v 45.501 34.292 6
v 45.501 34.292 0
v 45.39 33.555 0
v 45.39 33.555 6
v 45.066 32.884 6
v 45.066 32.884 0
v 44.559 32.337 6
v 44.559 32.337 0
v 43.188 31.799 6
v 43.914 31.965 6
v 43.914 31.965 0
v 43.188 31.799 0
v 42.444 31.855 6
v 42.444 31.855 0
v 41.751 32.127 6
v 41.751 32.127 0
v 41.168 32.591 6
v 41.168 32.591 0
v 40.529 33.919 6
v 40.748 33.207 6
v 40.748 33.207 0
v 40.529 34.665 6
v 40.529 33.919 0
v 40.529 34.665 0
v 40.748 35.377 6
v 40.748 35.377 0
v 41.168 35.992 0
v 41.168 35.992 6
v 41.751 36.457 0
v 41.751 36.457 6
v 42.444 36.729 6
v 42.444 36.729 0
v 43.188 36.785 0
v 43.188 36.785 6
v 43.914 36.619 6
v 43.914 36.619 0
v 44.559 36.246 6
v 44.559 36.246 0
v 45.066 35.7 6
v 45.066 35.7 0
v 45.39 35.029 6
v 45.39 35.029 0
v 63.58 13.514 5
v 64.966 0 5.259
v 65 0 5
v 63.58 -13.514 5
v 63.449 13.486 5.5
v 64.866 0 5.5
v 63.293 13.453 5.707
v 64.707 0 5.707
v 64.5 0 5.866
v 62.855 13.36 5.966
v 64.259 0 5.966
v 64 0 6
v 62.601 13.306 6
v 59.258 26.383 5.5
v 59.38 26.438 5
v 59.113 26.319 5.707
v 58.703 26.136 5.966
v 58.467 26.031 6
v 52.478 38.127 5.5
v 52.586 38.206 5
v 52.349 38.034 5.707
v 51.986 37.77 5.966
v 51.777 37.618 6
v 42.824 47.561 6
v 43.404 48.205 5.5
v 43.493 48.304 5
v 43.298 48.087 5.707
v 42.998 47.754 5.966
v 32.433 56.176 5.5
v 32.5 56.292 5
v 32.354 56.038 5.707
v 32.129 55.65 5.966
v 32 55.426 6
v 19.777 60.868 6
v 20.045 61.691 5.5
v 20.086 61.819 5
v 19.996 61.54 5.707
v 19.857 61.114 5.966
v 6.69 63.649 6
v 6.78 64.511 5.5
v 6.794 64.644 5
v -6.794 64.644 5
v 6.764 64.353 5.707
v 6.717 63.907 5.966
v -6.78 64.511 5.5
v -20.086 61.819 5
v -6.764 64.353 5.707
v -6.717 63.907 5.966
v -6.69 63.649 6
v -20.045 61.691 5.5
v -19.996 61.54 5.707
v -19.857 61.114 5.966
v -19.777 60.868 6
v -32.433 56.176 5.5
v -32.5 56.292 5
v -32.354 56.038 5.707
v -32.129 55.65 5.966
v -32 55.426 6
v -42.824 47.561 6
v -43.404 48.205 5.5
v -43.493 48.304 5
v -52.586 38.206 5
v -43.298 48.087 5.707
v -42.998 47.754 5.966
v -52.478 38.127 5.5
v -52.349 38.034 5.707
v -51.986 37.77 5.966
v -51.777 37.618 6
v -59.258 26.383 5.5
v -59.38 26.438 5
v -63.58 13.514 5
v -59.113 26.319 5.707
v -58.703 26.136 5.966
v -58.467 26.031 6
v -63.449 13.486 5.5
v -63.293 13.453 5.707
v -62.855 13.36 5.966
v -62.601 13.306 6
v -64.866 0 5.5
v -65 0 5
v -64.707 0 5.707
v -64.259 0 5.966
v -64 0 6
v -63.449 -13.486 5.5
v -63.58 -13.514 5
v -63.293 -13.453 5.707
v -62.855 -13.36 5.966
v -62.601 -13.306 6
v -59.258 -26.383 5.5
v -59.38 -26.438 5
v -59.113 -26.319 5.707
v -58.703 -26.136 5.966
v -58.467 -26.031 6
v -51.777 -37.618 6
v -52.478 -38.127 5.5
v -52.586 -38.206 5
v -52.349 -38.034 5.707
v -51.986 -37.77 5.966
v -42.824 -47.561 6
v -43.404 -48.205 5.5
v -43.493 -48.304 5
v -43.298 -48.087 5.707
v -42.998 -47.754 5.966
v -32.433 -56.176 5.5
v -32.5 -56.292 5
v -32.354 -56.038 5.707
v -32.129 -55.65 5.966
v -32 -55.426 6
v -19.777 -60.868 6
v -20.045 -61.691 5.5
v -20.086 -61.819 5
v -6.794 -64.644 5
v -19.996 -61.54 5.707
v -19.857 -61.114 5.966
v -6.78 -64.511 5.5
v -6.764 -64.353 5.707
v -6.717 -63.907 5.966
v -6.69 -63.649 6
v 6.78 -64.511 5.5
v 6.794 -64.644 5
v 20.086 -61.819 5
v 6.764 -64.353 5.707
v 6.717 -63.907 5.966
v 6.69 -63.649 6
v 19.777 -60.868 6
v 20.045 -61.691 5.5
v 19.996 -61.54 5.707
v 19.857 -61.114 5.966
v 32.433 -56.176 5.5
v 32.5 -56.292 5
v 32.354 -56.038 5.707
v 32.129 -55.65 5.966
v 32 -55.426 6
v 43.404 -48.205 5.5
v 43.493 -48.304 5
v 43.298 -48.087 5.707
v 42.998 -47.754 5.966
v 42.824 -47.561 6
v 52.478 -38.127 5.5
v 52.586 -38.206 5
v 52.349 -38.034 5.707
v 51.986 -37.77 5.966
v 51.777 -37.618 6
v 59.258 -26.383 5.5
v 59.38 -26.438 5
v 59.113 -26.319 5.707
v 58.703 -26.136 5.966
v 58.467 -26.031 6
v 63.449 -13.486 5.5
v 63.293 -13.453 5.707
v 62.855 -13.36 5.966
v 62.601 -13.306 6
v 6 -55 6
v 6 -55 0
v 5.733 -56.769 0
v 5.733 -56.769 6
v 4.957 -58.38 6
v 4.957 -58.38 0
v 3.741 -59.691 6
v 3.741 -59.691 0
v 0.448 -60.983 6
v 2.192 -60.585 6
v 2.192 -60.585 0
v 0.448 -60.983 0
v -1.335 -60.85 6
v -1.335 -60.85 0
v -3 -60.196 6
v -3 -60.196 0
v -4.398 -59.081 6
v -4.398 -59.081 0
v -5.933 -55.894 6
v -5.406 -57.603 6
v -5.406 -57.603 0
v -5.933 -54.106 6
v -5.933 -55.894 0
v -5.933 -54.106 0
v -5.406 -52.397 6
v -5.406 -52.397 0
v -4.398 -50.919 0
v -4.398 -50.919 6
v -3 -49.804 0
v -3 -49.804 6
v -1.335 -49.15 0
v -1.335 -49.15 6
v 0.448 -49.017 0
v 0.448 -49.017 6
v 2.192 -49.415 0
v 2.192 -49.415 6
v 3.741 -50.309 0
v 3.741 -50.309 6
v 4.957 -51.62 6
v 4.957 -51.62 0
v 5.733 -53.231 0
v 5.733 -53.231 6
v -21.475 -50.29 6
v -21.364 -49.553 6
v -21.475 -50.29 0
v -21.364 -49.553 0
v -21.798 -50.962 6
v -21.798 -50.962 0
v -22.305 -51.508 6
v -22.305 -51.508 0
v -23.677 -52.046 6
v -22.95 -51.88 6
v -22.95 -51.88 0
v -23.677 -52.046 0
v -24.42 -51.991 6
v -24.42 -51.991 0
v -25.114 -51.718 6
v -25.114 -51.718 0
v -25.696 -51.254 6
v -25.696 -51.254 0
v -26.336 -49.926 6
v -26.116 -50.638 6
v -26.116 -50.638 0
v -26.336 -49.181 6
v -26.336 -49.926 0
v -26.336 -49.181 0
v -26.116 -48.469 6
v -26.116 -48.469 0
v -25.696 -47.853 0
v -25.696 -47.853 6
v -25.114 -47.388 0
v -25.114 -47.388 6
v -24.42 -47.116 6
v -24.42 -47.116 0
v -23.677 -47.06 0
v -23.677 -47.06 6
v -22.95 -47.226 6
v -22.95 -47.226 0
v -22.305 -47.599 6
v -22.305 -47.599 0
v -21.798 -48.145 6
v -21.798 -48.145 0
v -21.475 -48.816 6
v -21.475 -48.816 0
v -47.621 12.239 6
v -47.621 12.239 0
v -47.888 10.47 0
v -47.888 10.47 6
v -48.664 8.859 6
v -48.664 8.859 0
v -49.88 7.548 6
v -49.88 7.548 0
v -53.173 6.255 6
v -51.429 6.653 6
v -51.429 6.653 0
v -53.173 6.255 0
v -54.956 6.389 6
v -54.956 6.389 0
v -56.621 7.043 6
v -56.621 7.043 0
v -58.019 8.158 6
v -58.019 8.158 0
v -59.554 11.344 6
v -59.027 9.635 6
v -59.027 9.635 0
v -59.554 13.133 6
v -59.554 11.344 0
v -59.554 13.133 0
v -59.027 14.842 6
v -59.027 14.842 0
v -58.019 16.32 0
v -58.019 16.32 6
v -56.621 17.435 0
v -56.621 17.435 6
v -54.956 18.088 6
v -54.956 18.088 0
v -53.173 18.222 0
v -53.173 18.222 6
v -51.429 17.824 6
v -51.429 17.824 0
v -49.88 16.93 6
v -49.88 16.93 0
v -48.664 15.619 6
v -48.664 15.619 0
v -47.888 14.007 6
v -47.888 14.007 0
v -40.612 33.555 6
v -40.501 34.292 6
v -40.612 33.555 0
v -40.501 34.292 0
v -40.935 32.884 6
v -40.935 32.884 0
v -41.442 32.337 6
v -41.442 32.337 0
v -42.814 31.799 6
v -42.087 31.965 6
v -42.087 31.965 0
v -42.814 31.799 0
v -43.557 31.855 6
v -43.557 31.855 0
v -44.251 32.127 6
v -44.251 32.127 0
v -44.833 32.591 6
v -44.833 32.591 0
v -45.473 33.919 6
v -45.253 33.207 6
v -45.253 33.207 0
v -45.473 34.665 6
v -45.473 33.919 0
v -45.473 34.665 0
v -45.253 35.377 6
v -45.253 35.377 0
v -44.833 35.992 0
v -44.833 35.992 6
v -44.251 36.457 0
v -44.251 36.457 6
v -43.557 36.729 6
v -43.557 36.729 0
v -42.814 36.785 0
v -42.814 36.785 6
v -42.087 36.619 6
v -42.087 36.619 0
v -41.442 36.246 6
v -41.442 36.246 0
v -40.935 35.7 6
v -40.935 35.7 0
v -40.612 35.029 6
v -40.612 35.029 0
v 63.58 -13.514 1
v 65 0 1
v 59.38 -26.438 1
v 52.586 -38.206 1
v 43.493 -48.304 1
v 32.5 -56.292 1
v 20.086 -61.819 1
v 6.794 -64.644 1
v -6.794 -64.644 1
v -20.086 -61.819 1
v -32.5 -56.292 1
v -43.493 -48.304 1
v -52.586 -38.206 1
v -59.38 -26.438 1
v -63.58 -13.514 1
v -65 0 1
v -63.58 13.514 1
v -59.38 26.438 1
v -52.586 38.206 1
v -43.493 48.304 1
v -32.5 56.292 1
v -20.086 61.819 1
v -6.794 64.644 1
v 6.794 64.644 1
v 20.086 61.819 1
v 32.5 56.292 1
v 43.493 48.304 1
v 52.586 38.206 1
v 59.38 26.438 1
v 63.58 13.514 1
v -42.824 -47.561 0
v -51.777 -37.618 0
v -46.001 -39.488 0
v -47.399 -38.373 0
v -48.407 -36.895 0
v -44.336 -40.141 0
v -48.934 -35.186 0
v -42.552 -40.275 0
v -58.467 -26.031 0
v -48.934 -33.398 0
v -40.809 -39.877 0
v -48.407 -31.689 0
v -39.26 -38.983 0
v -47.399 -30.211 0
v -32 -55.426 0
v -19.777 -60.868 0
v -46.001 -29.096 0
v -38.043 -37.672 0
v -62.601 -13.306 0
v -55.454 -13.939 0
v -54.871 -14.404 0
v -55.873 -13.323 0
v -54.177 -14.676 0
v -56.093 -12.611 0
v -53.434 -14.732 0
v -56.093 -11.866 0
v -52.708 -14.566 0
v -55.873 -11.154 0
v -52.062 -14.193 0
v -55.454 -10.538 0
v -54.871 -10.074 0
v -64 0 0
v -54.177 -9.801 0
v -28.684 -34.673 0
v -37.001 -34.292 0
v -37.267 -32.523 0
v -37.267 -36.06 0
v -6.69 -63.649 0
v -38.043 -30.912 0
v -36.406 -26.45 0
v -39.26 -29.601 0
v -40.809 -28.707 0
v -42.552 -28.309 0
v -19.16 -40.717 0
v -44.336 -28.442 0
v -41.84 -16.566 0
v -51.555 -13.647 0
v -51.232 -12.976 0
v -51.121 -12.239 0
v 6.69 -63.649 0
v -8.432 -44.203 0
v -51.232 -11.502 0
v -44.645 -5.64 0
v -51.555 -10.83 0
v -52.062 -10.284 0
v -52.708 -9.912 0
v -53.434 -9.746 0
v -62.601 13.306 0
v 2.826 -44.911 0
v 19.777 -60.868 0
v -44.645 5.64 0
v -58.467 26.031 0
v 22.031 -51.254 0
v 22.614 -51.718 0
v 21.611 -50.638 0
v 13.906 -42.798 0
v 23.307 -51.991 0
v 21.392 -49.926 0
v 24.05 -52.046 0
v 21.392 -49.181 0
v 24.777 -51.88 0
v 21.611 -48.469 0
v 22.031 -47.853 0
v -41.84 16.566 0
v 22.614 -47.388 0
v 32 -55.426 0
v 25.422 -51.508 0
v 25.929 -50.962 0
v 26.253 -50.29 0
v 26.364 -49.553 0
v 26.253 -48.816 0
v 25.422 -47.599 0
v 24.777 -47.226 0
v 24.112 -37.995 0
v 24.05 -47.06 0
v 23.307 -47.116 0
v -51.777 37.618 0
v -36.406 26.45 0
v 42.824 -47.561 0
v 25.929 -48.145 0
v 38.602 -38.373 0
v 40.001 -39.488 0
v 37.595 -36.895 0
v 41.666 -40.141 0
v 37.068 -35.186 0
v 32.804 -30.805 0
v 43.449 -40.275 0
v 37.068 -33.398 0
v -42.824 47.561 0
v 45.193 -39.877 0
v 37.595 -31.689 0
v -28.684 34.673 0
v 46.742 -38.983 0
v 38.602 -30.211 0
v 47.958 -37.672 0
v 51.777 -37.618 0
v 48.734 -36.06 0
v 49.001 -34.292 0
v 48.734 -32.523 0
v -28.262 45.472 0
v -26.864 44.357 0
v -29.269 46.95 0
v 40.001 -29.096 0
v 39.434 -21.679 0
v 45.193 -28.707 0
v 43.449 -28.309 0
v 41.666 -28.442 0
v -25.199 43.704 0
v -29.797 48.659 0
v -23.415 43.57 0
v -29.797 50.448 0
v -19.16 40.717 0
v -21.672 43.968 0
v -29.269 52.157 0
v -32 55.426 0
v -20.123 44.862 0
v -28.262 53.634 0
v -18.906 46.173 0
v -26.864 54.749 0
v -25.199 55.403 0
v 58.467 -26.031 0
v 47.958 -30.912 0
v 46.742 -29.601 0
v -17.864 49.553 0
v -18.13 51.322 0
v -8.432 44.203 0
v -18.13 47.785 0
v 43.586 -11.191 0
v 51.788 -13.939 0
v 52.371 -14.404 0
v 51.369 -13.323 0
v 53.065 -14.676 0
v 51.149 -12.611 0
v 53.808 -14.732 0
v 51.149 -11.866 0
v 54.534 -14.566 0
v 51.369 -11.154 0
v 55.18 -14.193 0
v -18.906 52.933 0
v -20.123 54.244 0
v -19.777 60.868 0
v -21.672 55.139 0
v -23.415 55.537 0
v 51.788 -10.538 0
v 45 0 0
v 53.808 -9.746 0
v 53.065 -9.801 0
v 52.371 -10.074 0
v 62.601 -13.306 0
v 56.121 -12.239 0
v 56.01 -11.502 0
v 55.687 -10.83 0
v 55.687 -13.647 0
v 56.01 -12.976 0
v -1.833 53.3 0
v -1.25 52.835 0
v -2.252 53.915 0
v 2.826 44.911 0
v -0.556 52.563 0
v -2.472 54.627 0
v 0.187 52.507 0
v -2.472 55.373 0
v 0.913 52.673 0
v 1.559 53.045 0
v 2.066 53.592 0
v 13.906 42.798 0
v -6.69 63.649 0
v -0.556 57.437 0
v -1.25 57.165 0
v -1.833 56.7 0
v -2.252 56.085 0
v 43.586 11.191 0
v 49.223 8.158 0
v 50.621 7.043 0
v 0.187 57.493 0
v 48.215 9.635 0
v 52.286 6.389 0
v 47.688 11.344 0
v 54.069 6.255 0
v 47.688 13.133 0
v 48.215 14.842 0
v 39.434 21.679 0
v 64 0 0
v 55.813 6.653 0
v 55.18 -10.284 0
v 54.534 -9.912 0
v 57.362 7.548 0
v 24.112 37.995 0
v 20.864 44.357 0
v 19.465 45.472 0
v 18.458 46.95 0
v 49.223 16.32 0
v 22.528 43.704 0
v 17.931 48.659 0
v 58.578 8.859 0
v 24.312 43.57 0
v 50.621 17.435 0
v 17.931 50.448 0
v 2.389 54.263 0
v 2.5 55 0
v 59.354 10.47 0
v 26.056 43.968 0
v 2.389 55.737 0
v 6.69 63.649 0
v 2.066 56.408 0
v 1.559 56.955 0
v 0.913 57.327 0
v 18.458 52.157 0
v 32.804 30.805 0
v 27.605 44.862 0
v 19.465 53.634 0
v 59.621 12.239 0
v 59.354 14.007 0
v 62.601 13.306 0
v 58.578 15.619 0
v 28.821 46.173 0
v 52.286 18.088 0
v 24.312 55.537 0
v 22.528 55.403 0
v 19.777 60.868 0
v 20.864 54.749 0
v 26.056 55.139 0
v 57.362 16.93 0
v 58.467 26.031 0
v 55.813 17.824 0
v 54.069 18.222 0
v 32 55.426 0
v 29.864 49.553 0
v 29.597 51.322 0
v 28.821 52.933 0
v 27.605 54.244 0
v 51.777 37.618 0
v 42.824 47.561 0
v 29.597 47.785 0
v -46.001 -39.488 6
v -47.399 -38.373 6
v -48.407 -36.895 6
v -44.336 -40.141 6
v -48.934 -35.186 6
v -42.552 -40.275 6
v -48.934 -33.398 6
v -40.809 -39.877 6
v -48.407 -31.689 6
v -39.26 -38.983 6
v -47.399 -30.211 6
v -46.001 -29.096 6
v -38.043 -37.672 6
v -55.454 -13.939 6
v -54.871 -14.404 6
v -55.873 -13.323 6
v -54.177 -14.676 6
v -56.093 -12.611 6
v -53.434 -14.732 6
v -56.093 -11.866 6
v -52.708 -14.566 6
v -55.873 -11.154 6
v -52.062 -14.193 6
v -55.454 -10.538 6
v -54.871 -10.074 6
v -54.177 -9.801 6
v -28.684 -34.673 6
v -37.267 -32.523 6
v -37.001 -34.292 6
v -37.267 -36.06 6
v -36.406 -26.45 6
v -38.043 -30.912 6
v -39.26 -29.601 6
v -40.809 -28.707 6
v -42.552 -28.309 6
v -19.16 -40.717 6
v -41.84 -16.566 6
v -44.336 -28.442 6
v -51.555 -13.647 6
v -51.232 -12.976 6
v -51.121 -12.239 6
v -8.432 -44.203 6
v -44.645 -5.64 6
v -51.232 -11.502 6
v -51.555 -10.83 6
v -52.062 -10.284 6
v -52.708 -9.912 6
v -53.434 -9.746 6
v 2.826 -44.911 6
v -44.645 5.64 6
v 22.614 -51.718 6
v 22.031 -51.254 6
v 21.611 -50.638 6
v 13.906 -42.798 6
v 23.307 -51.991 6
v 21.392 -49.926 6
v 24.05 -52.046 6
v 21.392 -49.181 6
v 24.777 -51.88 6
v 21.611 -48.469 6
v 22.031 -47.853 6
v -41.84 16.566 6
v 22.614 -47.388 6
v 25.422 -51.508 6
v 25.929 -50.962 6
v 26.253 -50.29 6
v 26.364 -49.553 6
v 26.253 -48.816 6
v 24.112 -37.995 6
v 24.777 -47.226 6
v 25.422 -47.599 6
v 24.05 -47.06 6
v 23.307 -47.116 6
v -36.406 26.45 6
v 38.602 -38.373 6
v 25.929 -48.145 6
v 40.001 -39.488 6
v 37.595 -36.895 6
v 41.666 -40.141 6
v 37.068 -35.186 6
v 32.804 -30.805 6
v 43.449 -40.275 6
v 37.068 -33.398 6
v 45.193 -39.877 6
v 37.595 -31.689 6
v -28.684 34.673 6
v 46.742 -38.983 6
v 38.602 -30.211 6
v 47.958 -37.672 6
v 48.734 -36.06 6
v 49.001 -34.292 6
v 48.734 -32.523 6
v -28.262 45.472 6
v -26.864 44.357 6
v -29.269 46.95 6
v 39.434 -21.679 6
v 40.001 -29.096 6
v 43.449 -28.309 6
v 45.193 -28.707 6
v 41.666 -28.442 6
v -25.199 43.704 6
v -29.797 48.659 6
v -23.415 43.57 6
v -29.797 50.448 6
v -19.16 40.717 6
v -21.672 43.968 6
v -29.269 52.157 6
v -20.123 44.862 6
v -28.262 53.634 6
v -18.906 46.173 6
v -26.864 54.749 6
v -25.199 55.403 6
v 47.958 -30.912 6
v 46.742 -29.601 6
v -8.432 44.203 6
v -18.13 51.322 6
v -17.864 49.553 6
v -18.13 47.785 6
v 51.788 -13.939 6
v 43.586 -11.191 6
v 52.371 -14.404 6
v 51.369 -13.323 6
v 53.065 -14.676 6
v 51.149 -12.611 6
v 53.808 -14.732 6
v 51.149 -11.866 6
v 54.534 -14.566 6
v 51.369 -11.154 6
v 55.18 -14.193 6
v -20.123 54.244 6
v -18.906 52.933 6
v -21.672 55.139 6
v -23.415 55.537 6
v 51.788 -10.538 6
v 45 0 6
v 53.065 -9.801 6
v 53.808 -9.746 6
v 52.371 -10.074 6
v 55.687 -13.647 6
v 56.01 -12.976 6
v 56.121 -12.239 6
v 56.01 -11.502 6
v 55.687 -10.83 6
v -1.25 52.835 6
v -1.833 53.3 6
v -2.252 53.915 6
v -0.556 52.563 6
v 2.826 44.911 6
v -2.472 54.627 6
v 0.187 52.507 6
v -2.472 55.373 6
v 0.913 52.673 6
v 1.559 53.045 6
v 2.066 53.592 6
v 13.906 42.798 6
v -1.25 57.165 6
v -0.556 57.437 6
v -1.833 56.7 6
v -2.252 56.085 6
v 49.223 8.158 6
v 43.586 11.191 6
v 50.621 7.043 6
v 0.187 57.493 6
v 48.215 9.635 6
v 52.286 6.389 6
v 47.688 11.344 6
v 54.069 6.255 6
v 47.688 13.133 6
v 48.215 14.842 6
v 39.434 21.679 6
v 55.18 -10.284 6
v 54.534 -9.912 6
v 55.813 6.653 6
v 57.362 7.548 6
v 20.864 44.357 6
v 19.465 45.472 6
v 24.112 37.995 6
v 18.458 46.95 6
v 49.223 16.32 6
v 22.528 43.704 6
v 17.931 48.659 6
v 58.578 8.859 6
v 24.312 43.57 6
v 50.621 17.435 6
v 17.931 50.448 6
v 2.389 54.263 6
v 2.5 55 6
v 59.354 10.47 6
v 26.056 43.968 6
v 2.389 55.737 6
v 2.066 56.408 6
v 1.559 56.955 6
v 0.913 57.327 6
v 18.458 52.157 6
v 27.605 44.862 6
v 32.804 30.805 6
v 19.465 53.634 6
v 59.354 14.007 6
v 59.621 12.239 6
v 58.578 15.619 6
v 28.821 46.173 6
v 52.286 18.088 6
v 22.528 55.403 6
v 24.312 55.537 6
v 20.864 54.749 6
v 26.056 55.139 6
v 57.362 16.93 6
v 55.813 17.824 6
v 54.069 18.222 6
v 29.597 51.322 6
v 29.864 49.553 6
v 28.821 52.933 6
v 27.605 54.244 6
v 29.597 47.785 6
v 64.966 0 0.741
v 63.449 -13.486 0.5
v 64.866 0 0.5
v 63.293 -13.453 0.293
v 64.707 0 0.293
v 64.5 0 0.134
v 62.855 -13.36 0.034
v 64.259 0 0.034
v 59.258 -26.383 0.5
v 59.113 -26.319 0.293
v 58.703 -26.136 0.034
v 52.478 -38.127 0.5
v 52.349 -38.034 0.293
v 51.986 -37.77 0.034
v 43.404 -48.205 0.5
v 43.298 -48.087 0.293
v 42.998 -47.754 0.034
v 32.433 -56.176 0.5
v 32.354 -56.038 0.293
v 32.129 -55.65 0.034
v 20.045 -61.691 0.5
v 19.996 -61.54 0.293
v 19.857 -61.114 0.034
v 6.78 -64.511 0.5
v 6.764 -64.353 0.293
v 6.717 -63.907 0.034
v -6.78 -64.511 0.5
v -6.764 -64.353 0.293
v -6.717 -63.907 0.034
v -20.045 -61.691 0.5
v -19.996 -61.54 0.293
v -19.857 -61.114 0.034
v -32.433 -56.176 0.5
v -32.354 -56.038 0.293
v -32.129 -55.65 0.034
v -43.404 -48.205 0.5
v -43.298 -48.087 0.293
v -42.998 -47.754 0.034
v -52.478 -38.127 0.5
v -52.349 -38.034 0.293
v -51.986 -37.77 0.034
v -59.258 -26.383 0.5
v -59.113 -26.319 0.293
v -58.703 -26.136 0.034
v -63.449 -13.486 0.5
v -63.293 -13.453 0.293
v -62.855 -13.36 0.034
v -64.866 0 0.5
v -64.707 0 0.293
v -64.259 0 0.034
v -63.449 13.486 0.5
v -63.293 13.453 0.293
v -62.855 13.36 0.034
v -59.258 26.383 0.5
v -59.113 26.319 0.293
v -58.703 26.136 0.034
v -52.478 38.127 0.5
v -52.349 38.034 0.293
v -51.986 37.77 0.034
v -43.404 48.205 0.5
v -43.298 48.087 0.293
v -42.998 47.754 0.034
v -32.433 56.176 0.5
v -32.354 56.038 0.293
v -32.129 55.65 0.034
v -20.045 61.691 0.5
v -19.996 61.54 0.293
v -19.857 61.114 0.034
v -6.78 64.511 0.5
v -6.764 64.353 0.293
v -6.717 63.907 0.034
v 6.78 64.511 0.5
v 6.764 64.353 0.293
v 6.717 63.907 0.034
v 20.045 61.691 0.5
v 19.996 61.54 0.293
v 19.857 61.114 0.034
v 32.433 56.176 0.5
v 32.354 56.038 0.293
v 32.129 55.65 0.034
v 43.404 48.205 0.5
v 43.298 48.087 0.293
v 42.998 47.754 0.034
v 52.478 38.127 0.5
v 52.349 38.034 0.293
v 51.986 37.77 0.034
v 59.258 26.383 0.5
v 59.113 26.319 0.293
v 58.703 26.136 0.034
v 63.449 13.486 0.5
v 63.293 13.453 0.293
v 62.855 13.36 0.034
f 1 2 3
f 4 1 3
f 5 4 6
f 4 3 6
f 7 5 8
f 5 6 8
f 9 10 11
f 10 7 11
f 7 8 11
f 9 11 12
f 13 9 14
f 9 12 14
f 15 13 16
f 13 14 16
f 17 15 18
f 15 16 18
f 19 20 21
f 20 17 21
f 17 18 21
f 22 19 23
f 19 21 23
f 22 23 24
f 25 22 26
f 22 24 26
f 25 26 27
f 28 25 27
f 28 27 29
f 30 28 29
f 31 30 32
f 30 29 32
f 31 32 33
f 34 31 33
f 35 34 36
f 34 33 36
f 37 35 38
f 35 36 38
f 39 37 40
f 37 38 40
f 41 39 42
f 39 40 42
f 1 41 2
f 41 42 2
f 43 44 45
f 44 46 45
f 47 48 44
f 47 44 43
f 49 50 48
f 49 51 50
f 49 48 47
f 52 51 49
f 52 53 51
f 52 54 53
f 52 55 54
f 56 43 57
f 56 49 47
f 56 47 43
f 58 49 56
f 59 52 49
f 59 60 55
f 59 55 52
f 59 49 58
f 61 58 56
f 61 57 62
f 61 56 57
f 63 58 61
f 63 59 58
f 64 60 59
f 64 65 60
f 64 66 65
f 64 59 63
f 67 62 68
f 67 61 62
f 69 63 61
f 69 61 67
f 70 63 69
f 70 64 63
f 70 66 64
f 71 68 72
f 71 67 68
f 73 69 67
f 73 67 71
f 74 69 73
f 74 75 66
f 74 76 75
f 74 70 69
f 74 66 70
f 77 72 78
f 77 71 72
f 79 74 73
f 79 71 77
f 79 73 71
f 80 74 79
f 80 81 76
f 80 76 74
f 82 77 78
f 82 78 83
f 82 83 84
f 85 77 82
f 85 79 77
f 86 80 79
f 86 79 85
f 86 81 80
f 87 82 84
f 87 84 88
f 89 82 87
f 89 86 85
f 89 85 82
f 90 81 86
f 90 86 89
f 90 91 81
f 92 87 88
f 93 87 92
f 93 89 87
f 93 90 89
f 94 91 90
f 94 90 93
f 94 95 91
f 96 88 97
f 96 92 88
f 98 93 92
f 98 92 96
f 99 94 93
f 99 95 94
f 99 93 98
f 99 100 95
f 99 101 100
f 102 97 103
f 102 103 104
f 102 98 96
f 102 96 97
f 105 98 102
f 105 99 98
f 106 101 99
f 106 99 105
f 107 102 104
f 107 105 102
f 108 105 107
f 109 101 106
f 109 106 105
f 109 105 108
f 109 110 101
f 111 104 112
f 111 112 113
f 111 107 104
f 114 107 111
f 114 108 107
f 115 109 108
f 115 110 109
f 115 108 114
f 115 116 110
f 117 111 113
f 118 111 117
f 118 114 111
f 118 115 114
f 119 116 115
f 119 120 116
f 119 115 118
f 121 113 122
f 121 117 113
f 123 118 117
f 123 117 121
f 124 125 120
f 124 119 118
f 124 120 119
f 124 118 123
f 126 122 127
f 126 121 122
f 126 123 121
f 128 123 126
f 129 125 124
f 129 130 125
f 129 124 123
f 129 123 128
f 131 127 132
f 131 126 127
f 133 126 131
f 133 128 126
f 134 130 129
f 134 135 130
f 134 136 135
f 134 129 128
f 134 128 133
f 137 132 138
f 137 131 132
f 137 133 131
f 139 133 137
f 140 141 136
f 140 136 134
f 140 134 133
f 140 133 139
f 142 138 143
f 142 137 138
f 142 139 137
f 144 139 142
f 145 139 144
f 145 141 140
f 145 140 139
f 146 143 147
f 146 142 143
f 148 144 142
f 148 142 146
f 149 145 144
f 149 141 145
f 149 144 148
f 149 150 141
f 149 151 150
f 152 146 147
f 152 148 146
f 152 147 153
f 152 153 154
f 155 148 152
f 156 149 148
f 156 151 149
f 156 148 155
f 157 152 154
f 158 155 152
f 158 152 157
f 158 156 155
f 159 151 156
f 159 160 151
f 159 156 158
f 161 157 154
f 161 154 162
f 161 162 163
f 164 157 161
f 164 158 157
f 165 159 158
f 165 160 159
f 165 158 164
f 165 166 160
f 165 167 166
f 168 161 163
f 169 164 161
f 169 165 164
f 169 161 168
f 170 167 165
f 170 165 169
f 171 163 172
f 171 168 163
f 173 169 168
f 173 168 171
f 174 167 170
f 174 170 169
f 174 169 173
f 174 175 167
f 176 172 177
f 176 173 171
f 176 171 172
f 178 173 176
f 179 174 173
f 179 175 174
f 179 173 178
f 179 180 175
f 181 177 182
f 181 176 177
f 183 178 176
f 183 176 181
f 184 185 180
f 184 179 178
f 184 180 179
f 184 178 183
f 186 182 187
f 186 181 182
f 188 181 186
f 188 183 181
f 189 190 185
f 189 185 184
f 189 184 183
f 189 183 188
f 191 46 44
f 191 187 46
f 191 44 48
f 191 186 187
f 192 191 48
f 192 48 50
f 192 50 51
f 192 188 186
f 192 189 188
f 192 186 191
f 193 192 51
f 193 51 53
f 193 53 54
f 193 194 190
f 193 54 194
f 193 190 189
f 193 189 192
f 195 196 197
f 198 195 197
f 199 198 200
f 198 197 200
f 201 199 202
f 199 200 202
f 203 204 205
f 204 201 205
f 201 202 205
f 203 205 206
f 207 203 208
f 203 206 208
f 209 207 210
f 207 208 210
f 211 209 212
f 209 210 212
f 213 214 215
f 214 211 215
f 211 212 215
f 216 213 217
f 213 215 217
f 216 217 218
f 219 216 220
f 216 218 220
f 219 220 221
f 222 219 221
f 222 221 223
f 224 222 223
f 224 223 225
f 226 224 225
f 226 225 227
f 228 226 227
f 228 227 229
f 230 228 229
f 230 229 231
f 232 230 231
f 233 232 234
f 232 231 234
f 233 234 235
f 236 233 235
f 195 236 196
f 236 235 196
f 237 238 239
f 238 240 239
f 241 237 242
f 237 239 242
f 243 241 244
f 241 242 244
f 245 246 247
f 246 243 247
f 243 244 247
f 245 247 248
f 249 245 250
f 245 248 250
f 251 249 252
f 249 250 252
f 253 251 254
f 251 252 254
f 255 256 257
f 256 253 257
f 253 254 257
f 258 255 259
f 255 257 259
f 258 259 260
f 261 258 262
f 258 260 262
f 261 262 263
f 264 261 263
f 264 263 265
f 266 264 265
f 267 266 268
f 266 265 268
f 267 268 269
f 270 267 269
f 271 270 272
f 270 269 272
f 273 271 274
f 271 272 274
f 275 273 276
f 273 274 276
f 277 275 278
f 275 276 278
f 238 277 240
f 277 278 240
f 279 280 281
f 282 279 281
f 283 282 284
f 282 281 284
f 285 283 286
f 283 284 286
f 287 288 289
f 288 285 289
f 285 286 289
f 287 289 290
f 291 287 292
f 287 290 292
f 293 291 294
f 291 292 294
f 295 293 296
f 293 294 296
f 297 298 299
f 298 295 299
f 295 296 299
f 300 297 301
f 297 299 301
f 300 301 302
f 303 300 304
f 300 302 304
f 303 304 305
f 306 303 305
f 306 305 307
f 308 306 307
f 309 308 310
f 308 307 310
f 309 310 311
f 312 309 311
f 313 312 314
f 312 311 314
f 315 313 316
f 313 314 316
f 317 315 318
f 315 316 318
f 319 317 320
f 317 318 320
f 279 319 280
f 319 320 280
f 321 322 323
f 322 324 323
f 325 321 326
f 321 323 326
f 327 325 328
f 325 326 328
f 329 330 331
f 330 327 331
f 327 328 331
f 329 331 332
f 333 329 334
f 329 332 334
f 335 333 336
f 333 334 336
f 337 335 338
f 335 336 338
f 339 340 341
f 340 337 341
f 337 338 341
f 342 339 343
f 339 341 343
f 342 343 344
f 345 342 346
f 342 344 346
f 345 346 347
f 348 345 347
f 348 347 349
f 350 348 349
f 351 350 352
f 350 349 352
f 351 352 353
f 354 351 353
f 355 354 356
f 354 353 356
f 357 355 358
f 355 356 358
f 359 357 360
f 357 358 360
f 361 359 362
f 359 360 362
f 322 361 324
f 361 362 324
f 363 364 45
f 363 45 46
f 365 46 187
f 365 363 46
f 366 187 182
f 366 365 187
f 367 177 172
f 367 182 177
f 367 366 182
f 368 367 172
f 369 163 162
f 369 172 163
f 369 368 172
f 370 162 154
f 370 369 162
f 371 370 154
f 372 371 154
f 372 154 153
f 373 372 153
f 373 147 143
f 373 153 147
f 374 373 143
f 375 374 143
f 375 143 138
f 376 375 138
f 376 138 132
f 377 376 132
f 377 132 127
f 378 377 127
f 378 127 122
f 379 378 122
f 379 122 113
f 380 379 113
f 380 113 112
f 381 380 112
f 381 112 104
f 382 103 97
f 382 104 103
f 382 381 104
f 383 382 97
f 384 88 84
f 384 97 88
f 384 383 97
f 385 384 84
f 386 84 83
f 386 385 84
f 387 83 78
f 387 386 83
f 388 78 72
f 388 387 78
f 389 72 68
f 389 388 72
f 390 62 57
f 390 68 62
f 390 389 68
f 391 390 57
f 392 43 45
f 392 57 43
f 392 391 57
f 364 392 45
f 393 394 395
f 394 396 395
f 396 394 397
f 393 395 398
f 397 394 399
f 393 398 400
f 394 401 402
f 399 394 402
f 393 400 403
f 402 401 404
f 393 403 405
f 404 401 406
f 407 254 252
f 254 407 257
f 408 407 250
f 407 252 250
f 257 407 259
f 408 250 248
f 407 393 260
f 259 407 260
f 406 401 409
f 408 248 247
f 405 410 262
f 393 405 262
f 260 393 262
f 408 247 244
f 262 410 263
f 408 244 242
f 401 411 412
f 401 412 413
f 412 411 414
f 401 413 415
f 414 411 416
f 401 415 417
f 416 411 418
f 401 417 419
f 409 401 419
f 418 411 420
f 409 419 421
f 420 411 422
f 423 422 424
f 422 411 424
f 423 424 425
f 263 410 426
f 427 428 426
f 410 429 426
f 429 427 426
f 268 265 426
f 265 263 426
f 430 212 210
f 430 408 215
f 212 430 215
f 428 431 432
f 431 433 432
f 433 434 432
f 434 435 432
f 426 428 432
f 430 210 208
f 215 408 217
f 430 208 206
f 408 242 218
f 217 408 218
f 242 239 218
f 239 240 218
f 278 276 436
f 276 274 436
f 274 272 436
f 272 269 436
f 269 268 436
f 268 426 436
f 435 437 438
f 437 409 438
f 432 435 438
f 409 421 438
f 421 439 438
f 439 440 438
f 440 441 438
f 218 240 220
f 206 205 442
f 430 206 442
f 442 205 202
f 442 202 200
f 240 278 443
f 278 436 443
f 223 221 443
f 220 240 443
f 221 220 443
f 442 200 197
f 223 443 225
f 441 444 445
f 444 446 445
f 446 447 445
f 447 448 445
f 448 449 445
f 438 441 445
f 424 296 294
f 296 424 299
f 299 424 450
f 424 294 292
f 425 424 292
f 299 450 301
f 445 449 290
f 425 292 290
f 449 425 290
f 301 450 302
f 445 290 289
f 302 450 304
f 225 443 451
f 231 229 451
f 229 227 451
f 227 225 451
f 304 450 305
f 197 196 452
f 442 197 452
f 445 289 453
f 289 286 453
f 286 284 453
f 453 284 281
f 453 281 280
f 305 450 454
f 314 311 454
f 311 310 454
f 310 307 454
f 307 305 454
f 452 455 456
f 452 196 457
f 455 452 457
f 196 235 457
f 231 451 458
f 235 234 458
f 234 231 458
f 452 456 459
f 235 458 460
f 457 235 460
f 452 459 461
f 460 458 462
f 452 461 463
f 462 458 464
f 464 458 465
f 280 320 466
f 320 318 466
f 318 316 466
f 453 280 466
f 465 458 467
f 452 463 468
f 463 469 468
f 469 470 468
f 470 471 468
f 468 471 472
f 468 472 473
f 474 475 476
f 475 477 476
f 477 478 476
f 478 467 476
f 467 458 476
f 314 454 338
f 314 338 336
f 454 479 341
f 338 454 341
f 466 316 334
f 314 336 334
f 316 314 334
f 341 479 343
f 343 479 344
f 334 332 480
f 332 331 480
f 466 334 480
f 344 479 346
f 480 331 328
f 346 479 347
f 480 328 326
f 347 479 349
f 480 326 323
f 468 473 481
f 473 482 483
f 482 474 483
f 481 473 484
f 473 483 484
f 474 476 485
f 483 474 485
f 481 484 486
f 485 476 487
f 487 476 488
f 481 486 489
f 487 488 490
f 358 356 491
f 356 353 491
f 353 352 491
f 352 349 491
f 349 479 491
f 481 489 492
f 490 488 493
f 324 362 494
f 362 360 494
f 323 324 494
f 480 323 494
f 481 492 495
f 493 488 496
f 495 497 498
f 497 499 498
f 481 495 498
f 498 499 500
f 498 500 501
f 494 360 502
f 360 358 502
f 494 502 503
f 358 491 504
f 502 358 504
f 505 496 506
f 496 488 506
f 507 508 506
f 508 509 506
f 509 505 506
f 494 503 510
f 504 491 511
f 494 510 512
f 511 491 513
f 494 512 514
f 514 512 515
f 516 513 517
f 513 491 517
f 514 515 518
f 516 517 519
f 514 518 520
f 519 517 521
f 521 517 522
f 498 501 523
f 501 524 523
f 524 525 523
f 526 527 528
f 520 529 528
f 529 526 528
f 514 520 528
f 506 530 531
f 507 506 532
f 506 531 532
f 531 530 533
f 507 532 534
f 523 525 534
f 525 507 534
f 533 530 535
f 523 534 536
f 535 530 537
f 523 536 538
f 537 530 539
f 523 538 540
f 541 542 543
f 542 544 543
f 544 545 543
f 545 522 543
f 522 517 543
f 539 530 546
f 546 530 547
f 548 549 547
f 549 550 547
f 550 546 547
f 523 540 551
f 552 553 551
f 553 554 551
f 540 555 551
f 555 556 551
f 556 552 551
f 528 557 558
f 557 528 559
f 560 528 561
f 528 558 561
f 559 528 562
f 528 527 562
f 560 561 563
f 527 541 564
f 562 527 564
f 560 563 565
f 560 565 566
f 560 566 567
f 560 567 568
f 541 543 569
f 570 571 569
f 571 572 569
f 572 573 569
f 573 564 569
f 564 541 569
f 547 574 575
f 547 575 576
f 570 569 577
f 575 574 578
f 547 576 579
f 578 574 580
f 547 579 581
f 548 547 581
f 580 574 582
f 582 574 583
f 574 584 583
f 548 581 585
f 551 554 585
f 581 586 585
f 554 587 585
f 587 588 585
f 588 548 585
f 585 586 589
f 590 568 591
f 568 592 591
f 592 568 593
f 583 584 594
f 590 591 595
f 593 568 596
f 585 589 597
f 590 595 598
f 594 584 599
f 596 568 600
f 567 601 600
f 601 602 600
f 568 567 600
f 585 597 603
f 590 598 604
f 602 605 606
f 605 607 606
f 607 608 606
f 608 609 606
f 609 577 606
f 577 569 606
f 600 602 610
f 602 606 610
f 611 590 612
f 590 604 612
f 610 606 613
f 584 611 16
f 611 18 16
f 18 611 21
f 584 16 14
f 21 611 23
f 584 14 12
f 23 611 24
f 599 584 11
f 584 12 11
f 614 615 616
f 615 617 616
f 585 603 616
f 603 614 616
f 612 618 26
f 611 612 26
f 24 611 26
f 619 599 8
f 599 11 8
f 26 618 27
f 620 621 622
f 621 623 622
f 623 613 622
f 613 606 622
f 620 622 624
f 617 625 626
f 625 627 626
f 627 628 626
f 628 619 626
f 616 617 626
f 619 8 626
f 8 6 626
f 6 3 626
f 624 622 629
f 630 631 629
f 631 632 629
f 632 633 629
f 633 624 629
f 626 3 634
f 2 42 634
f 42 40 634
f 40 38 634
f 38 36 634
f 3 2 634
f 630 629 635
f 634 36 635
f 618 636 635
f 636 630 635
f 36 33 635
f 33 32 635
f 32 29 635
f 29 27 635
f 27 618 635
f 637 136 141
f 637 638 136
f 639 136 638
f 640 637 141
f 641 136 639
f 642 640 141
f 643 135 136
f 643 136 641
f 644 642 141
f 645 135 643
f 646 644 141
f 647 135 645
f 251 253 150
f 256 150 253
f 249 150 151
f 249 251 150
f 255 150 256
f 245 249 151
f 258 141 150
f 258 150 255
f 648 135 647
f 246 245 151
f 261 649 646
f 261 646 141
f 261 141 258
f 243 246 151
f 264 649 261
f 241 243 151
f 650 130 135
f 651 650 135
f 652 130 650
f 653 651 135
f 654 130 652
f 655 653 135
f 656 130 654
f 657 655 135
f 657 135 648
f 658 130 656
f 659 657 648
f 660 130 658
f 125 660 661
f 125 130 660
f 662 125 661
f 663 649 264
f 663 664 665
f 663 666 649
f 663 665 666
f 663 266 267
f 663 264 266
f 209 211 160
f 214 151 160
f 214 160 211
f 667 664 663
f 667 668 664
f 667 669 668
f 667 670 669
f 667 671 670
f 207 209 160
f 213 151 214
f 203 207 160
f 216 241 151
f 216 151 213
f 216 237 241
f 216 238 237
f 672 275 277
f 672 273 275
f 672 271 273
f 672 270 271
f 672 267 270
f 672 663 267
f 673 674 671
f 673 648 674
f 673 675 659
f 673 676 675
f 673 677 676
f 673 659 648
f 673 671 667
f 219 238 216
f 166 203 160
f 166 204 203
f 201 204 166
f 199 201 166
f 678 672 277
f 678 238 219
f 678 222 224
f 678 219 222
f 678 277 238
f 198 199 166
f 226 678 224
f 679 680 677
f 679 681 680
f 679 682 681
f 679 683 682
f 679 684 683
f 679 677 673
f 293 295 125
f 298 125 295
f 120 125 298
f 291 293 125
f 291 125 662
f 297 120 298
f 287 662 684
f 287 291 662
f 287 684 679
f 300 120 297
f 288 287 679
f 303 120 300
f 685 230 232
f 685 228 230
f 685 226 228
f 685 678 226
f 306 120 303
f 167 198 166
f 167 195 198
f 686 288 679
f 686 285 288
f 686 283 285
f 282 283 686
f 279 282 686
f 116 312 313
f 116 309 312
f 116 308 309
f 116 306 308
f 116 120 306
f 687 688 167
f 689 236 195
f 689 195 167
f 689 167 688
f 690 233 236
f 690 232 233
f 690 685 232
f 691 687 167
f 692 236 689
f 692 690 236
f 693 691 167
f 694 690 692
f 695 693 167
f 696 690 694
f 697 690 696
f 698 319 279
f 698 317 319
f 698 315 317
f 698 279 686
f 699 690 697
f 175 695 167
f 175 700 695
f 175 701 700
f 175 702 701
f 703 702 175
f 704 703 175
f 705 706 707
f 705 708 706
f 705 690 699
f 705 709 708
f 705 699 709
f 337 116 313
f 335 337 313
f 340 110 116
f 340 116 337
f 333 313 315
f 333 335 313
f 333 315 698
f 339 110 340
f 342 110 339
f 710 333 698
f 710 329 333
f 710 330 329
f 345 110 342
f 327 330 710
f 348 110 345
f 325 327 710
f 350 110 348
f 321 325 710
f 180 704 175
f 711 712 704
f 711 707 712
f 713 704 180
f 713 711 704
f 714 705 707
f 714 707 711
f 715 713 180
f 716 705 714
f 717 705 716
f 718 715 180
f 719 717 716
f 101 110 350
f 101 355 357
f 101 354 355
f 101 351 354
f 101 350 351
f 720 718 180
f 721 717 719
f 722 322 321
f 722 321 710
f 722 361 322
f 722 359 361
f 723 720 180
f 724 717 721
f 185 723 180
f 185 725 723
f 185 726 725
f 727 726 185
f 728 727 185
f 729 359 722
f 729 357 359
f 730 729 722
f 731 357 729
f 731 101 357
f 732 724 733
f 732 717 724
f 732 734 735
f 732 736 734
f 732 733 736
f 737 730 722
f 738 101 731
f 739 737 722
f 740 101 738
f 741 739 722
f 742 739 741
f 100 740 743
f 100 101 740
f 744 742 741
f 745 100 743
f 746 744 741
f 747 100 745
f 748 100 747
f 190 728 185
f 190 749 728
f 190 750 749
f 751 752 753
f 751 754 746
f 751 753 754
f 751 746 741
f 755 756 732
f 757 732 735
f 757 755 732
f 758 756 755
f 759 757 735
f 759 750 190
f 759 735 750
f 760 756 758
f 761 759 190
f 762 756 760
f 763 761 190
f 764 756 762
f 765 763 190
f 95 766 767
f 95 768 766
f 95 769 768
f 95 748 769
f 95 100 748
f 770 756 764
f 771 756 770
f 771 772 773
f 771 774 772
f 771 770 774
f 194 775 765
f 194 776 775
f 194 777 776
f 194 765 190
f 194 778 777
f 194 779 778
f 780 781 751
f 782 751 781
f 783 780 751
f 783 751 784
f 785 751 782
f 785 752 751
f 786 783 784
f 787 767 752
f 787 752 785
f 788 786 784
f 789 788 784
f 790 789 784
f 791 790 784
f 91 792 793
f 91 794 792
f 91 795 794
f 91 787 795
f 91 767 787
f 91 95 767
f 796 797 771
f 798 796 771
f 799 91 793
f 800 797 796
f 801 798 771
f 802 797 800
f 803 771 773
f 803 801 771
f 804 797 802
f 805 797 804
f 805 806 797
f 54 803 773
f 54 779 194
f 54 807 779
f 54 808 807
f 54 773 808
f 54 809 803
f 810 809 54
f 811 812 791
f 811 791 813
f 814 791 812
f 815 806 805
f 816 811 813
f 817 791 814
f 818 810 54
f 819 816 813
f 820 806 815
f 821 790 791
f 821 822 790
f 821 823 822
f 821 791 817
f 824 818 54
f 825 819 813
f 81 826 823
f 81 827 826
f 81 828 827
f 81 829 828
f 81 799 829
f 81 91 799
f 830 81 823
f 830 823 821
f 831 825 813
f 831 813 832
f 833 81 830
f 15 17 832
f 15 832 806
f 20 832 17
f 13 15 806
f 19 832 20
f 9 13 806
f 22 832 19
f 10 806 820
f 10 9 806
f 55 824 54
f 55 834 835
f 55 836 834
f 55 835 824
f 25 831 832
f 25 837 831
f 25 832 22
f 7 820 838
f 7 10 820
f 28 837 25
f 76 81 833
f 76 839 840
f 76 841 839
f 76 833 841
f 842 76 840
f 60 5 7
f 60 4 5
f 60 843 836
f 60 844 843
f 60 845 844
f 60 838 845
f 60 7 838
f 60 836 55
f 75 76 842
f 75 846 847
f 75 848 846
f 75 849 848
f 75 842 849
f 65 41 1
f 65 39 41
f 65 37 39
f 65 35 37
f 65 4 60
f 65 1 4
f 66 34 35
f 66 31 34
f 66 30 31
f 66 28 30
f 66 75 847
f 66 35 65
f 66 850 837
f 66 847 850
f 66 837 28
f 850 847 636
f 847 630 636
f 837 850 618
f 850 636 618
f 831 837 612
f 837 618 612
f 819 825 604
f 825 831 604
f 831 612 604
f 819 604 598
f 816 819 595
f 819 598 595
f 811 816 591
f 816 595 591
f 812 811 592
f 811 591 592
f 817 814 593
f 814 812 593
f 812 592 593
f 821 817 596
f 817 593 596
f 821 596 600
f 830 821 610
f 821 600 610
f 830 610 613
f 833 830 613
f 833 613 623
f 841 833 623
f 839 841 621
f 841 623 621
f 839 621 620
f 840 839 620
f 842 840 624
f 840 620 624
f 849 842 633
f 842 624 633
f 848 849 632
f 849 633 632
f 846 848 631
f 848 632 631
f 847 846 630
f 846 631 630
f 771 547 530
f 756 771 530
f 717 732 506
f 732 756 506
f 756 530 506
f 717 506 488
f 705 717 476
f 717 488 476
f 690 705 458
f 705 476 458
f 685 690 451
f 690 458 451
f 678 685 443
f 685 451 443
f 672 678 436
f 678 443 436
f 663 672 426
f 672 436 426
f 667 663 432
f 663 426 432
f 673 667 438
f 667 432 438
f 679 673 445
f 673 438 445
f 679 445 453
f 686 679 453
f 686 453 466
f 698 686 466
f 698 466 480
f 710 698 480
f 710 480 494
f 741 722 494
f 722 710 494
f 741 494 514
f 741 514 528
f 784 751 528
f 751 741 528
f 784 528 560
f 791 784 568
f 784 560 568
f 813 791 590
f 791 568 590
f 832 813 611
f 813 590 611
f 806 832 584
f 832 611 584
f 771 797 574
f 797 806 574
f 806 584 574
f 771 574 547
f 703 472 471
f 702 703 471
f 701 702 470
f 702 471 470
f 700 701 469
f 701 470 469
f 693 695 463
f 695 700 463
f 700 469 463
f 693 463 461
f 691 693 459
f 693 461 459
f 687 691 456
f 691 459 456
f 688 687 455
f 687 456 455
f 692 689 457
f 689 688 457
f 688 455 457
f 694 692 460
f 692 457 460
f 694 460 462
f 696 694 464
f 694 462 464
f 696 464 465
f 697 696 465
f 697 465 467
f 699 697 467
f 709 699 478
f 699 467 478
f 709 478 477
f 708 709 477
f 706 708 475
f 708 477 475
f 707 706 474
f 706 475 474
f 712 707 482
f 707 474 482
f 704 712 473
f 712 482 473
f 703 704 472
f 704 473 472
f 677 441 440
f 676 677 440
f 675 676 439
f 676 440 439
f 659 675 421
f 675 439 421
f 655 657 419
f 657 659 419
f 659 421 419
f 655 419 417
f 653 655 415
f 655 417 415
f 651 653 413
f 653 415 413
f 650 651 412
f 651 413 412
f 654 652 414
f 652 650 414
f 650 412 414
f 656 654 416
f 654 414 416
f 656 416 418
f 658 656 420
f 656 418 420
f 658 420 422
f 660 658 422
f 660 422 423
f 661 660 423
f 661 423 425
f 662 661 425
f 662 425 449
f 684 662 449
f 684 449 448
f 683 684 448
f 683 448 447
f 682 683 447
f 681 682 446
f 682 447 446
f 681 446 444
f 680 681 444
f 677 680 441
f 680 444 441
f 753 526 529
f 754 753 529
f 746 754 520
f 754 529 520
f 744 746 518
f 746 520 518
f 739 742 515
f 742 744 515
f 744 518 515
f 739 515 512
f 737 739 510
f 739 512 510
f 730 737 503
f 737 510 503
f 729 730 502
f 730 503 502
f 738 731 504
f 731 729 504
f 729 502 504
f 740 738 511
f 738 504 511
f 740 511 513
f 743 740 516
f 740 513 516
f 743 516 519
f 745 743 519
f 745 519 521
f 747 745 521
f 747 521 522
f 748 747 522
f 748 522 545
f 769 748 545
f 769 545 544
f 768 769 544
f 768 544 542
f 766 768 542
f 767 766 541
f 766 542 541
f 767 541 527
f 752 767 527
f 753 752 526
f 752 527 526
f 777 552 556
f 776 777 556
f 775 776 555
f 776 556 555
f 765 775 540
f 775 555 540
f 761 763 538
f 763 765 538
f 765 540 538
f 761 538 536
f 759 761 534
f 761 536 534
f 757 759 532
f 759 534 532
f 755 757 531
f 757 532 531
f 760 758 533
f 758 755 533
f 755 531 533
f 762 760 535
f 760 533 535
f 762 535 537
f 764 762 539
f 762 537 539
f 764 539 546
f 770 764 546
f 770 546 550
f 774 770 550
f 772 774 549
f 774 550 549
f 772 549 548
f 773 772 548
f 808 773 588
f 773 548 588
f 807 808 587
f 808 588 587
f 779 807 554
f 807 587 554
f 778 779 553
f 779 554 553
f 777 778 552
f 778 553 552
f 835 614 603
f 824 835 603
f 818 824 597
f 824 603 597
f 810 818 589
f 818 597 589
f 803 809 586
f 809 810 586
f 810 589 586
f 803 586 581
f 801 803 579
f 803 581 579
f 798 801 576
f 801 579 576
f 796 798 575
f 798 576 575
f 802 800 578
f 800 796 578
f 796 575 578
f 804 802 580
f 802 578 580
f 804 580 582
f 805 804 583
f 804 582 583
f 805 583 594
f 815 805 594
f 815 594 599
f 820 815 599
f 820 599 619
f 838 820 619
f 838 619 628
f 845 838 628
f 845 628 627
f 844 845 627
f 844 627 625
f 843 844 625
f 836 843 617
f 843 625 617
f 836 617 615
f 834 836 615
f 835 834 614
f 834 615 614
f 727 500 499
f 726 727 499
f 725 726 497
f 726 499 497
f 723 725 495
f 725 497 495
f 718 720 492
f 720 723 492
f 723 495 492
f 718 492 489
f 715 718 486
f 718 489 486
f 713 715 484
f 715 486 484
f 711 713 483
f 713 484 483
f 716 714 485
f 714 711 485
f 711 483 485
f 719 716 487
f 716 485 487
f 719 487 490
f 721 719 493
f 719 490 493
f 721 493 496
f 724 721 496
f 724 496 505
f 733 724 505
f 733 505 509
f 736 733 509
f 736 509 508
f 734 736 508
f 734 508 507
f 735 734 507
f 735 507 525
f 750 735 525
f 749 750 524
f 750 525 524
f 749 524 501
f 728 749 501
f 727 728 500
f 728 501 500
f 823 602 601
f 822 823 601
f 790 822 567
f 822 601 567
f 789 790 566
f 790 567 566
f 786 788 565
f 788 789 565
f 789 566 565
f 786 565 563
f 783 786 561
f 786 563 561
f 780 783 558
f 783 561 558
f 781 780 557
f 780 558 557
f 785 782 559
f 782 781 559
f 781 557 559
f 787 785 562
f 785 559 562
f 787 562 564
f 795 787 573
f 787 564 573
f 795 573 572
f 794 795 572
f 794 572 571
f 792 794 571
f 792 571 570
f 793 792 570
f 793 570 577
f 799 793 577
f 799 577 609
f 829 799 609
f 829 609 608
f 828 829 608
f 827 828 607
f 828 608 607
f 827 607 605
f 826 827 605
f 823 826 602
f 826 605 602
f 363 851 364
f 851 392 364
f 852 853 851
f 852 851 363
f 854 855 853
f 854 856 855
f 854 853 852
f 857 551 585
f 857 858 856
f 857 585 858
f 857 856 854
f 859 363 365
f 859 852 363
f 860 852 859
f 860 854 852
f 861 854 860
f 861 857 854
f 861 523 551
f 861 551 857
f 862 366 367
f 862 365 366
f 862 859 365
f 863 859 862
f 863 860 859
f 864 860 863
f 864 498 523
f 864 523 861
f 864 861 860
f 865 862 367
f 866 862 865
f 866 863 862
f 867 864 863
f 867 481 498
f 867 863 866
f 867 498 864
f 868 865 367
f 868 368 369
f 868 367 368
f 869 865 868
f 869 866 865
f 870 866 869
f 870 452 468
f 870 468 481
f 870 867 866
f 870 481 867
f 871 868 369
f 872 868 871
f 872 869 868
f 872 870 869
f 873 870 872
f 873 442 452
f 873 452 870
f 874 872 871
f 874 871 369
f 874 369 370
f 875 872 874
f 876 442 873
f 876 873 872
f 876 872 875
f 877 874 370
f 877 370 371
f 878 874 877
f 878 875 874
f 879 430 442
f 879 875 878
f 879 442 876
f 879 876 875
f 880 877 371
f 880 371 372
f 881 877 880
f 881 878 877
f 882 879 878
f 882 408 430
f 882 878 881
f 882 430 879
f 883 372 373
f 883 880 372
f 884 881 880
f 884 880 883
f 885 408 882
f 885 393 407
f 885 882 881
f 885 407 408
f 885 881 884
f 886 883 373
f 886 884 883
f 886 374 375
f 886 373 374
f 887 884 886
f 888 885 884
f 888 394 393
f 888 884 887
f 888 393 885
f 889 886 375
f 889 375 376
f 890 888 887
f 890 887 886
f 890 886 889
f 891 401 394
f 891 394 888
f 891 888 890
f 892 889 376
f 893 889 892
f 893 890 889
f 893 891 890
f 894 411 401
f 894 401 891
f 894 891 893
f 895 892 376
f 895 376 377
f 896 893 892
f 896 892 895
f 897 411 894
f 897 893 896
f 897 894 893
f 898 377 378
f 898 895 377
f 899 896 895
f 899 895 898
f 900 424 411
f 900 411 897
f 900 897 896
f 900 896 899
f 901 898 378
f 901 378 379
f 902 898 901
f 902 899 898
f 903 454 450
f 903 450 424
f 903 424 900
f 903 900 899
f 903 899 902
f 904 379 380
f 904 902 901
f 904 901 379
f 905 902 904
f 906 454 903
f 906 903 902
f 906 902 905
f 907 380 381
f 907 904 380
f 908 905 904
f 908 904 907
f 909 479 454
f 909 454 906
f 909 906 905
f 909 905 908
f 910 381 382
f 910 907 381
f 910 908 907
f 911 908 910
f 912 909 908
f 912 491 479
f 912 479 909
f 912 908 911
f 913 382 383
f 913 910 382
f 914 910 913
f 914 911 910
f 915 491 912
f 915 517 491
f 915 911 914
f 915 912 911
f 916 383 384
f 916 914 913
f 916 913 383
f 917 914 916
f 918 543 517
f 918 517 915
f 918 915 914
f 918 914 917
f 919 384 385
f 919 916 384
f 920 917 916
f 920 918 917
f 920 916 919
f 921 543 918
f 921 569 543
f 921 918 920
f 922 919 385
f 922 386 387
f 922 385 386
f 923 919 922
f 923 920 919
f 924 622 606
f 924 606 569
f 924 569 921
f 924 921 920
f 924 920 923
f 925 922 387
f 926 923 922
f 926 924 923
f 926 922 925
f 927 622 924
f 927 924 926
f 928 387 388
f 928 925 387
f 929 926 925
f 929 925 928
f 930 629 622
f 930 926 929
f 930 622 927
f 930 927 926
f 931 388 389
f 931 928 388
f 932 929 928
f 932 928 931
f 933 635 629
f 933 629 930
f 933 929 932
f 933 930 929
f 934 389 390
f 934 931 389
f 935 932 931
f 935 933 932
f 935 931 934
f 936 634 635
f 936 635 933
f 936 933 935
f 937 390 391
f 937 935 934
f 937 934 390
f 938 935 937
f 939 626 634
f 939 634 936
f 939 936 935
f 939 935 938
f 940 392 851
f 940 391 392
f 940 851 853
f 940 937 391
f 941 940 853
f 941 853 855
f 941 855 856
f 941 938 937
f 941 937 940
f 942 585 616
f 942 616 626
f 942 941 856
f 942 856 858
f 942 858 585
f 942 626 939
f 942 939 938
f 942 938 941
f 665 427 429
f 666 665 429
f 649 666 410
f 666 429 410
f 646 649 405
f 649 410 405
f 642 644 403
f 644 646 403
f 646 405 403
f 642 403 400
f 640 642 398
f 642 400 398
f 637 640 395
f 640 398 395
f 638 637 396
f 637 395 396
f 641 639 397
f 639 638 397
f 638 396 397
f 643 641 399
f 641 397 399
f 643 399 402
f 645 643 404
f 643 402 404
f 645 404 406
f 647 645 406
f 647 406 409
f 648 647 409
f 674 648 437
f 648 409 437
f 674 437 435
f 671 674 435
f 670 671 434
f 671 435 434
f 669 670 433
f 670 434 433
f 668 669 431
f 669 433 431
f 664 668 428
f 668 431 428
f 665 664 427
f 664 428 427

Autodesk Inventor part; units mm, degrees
ref_plane "YZ Plane" through (0, 0, 0) normal (1, 0, 0) x (0, 1, 0)
ref_plane "XZ Plane" through (0, 0, 0) normal (0, 1, 0) x (-1, 0, 0)
ref_plane "XY Plane" through (0, 0, 0) normal (0, 0, 1) x (1, 0, 0)
sketch "Sketch1" plane through (0, 0, 0) normal (0, 0, 1) x (1, 0, 0)
  circle A0 centre (0, 0) radius 45
  circle A1 centre (0, 0) radius 65
  circle A2 centre (0, 0) radius 55 construction
  circle A3 centre (0, -55) radius 6
  circle A4 centre (0, 55) radius 2.5
  line L0 (0, 0) -> (0, 34.6858) construction
  circle A5 centre (-43.0007, 34.2919) radius 2.5
  circle A6 centre (43.0007, -34.2919) radius 6
  circle A7 centre (-53.621, -12.2387) radius 2.5
  circle A8 centre (53.621, 12.2387) radius 6
  circle A9 centre (-23.8636, -49.5533) radius 2.5
  circle A10 centre (23.8636, 49.5533) radius 6
  circle A11 centre (23.8636, -49.5533) radius 2.5
  circle A12 centre (-23.8636, 49.5533) radius 6
  circle A13 centre (53.621, -12.2387) radius 2.5
  circle A14 centre (-53.621, 12.2387) radius 6
  circle A15 centre (43.0007, 34.2919) radius 2.5
  circle A16 centre (-43.0007, -34.2919) radius 6
  point P0 (0, 17.3429)
  dimension "d0" = 90
  dimension "d1" = 130
  dimension "d2" = 110
  dimension "d3" = 12
  dimension "d4" = 5
  dimension "d7" = 360
extrude "Extrusion1" add sketch "Sketch1" along normal blind 6
fillet "Fillet1" radius 1 2 edges at (-65, 0, 6) (-65, 0, 0)
properties part number "Component 10(Assembly Ring)"
